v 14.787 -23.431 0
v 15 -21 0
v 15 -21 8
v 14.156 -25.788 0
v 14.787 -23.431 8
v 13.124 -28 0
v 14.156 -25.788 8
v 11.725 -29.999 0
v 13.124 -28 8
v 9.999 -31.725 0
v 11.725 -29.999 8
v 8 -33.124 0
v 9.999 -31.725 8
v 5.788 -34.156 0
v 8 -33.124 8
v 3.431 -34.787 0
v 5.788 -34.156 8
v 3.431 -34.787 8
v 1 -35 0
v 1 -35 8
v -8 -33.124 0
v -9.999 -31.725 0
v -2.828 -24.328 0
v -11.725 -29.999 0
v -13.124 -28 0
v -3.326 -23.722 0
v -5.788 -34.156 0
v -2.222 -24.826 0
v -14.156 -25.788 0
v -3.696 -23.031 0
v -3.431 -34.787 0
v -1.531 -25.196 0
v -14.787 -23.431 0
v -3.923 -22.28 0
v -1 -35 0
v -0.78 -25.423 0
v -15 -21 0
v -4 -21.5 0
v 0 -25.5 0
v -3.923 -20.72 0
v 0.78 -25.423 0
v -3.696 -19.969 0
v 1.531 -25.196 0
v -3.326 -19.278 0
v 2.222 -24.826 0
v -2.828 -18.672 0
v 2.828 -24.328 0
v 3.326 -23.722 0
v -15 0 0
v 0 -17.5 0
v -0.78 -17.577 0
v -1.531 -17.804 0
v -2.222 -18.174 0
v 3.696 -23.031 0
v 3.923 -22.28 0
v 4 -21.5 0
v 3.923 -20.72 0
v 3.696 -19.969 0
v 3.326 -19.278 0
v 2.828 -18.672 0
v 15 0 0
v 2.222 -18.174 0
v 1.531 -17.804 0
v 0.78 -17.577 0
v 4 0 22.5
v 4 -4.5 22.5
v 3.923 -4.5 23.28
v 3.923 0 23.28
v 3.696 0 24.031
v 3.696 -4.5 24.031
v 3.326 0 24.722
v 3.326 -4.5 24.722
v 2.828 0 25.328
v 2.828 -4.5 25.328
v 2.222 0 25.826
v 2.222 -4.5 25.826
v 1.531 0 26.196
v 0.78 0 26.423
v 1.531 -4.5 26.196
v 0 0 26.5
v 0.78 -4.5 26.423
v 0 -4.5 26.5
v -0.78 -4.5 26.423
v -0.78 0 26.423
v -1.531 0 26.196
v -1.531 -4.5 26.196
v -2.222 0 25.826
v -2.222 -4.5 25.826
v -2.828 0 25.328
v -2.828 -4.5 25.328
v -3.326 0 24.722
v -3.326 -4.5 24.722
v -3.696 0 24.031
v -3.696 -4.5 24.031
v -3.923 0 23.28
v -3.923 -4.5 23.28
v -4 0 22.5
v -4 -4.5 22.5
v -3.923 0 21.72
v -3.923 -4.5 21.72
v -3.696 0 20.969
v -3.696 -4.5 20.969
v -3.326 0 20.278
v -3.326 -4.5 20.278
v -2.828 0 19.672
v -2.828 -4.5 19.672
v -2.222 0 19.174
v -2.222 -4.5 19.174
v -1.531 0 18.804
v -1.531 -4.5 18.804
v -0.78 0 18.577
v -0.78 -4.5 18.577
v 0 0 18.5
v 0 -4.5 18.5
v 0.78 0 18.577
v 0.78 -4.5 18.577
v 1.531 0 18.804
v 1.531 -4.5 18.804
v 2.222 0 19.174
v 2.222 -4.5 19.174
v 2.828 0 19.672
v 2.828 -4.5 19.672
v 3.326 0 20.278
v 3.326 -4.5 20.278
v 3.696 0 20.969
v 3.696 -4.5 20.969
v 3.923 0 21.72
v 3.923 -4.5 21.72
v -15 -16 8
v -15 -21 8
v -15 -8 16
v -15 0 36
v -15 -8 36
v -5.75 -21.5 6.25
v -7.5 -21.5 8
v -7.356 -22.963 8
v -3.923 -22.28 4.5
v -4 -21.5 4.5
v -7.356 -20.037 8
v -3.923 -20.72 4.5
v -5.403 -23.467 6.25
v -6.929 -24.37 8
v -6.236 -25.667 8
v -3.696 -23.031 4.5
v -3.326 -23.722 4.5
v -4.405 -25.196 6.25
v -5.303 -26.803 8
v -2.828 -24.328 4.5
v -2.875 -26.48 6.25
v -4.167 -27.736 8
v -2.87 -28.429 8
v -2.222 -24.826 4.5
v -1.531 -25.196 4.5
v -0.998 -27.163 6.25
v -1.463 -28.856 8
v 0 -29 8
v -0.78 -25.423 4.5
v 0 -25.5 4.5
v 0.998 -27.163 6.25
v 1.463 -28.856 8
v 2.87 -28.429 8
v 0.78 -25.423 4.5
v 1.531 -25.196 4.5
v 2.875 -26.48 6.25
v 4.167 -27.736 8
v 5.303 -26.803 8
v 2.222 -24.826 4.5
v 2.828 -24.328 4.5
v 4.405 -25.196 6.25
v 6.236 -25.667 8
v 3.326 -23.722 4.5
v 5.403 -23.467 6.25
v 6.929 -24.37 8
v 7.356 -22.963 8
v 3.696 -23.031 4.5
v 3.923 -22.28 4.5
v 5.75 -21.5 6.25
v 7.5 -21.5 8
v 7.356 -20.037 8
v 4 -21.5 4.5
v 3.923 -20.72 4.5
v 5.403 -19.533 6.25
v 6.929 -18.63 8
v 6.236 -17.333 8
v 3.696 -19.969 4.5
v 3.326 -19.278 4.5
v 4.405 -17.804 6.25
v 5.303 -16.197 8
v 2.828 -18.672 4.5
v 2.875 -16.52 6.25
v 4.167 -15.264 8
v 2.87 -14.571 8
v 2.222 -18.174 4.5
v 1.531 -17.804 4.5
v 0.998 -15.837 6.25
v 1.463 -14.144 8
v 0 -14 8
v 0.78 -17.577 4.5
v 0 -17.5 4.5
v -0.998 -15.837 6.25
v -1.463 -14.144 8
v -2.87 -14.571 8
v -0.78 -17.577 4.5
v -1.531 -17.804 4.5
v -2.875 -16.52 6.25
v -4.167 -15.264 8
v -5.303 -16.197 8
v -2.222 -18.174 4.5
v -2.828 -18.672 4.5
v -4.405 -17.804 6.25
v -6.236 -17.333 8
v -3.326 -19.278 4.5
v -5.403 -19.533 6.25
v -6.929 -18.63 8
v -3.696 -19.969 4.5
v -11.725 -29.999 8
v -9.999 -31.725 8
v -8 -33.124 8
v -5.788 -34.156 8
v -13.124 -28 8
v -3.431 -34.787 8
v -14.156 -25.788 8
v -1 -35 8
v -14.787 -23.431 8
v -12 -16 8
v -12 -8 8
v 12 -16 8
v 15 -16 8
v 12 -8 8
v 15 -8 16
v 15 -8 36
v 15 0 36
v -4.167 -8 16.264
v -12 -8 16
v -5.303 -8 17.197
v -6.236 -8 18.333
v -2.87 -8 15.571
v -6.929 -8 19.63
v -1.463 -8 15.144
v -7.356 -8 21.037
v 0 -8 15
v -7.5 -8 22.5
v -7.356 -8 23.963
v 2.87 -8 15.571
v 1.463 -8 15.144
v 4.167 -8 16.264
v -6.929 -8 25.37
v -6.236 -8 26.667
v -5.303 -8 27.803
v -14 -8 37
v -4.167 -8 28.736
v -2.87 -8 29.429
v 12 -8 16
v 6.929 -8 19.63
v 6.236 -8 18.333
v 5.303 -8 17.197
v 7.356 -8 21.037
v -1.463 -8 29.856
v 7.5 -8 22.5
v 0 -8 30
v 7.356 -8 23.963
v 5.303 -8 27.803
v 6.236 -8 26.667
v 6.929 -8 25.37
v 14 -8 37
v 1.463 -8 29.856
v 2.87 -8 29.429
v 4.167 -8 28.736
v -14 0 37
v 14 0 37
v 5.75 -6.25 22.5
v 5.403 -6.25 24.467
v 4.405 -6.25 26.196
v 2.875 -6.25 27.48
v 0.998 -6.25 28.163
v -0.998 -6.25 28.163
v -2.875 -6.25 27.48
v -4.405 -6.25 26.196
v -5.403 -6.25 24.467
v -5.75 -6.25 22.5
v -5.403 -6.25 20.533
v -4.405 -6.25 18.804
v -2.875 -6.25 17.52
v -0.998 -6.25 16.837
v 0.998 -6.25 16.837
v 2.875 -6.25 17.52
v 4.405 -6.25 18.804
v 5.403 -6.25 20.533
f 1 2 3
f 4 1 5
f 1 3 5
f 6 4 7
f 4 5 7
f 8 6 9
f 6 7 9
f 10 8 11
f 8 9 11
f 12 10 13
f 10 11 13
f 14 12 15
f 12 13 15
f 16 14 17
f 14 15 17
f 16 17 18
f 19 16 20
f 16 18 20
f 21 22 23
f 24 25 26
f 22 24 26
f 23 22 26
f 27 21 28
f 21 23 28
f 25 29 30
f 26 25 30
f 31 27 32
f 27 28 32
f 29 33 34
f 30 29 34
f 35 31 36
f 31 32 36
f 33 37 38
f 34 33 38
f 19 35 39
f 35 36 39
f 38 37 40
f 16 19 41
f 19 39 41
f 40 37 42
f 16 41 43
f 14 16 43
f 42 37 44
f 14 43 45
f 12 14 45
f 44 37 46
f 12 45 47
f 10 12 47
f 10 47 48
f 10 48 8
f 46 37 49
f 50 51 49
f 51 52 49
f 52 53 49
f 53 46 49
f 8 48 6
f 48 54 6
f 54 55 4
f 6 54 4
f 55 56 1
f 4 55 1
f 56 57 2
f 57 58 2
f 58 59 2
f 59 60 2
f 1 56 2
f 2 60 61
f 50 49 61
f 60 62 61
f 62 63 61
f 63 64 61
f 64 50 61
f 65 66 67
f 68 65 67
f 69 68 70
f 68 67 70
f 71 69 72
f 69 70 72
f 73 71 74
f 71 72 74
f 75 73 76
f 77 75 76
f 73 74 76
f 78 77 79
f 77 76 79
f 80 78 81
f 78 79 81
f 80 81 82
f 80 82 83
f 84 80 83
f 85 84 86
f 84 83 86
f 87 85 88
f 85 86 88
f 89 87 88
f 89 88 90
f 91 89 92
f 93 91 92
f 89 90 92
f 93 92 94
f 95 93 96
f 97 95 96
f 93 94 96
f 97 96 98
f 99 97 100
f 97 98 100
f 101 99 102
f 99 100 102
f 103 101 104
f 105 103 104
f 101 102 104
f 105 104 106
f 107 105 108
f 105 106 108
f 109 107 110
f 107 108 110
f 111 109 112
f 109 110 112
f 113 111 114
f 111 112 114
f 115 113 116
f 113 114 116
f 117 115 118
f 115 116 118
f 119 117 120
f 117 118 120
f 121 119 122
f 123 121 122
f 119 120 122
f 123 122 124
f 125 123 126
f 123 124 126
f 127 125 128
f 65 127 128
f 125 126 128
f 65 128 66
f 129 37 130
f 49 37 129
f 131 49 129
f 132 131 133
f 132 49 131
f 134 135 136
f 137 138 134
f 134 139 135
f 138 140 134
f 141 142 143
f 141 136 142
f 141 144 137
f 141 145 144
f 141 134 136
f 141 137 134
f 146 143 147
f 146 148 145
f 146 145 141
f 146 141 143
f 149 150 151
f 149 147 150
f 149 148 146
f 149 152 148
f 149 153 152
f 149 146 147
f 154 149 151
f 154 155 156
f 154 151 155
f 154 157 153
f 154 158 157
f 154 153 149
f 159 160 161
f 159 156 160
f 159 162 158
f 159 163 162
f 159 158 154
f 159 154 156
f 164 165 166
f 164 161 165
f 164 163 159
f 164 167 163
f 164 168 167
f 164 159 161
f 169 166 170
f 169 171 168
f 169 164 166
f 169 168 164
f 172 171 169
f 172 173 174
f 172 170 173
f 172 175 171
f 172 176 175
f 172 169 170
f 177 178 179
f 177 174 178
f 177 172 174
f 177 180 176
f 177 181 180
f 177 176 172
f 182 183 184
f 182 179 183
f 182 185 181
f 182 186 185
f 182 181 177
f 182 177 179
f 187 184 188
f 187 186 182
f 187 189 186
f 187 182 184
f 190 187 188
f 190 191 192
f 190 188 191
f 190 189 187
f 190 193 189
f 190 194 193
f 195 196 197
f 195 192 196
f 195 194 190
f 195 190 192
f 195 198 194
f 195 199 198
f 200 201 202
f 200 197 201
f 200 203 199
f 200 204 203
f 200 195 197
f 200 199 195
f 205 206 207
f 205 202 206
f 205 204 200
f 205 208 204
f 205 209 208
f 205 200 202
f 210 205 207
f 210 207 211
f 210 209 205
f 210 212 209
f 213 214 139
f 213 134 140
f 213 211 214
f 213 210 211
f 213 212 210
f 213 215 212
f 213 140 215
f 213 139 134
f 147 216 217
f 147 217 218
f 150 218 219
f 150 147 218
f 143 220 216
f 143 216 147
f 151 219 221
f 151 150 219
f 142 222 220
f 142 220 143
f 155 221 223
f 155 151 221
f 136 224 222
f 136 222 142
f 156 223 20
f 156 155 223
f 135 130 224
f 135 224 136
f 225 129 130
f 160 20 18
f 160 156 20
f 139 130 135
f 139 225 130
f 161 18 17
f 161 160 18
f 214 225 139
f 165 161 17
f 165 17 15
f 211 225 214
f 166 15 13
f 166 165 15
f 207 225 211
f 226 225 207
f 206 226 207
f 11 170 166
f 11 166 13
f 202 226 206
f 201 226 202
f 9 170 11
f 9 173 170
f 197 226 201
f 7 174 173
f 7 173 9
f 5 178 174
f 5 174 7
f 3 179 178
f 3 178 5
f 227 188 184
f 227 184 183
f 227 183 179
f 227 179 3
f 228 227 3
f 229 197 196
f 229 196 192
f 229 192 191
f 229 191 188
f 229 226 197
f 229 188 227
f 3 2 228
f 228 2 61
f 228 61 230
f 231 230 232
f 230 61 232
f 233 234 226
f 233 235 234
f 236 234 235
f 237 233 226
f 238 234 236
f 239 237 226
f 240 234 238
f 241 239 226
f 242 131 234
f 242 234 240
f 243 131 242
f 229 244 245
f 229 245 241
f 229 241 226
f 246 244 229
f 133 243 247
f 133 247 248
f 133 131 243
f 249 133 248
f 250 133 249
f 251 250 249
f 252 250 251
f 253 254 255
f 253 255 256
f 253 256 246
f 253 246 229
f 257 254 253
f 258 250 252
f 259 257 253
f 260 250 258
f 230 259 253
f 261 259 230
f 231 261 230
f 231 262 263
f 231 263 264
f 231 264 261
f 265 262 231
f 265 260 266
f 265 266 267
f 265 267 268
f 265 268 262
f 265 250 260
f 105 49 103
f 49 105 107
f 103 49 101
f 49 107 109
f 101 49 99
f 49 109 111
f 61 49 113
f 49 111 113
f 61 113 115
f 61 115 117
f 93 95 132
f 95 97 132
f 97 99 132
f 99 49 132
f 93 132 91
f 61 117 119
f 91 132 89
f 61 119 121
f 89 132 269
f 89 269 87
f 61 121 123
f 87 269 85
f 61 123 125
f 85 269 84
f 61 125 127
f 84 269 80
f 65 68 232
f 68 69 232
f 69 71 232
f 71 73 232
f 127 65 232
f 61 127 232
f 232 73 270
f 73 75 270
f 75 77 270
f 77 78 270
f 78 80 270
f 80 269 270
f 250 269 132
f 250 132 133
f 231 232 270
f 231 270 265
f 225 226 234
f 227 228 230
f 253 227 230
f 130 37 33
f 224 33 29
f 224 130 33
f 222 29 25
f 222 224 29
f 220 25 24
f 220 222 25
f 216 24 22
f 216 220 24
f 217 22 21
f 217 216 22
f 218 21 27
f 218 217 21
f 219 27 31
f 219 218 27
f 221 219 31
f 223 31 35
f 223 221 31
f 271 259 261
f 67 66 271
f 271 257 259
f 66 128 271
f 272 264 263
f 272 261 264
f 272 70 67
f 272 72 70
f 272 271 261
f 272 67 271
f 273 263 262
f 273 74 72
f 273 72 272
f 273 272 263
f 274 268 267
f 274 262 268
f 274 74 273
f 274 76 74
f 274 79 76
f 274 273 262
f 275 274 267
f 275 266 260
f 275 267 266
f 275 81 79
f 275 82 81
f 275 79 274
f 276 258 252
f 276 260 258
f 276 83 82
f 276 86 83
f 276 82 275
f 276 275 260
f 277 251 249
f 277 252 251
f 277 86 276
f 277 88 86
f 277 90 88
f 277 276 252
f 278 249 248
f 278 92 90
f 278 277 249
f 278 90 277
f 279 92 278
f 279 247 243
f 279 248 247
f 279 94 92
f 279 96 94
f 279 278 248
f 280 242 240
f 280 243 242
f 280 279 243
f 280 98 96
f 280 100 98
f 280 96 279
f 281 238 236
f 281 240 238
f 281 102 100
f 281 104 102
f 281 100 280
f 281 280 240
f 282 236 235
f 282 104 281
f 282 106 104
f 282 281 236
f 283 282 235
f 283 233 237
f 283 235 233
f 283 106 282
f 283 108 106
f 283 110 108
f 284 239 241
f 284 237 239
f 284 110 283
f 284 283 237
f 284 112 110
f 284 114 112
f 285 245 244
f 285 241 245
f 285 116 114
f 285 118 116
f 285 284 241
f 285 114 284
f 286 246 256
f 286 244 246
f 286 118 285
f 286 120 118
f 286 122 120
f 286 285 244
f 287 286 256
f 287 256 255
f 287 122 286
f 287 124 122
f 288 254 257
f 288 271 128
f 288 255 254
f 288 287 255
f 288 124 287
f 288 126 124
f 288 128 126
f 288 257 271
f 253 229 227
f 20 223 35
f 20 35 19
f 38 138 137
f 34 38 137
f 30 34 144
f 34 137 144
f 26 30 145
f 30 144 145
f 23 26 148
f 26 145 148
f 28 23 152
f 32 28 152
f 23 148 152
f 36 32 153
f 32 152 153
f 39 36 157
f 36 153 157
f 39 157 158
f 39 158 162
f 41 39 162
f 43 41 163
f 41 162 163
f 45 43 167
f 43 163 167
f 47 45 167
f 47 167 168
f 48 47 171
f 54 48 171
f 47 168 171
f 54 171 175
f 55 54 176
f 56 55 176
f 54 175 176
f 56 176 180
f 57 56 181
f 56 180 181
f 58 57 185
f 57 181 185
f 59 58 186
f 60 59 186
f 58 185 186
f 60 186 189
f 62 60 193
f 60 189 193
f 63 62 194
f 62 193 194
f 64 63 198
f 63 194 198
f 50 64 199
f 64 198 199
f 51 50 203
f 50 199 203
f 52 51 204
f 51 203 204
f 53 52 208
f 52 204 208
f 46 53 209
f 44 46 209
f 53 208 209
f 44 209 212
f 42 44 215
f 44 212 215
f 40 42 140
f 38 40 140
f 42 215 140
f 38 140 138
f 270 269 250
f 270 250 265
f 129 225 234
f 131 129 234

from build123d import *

# Parameters (mm, degrees)
SKETCH_W        = 30
SKETCH_H        = 37
PAD_DEPTH       = 35
FILLET_R        = 14
BOX_W           = 32
BOX_H           = 32
BOX_DEPTH       = 32
SKETCH001_R     = 4
POCKET_DEPTH    = 8
SKETCH002_R     = 4
POCKET001_DEPTH = 8
CHAMFER_SIZE    = 3.5
CHAMFER001_SIZE = 1
SKETCH003_W     = 3
SKETCH003_H     = 8
PAD001_DEPTH    = 8
POCKET002_DEPTH = 30.001


with BuildPart() as part:
    # Sketch → Pad (new body)
    with BuildSketch(Plane.XZ):
        with Locations((0, 18.5)):
            Rectangle(SKETCH_W, SKETCH_H)
    extrude(amount=PAD_DEPTH)

    # Fillet
    fillet_edges = [part.edges().sort_by_distance(p)[0] for p in [
        (15, -35, 18.5),
        (-15, -35, 18.5),
    ]]
    fillet(fillet_edges, radius=FILLET_R)

    # Box → Box (cut)
    with BuildSketch(Plane(origin=(-16, -8, 8), x_dir=(1, 0, 0), z_dir=(0, -1, 0))):
        with Locations((16, 16)):
            Rectangle(BOX_W, BOX_H)
    extrude(amount=BOX_DEPTH, mode=Mode.SUBTRACT)

    # Sketch001 (on Face6 of Box) → Pocket (cut)
    with BuildSketch(Plane(origin=(0, -8, 22.5), x_dir=(1, 0, 0), z_dir=(0, -1, 0))):
        Circle(SKETCH001_R)
    extrude(amount=-POCKET_DEPTH, mode=Mode.SUBTRACT)

    # Sketch002 (on Face5 of Pocket) → Pocket001 (cut)
    with BuildSketch(Plane(origin=(0, -21.5, 8), x_dir=(-1, 0, 0), z_dir=(0, 0, 1))):
        Circle(SKETCH002_R)
    extrude(amount=-POCKET001_DEPTH, mode=Mode.SUBTRACT)

    # Chamfer
    chamfer_edges = [part.edges().sort_by_distance(p)[0] for p in [
        (-4, -8, 22.5),
        (4, -21.5, 8),
    ]]
    chamfer(chamfer_edges, length=CHAMFER_SIZE)

    # Chamfer001
    chamfer001_edges = [part.edges().sort_by_distance(p)[0] for p in [
        (15, -4, 37),
        (-15, -4, 37),
    ]]
    chamfer(chamfer001_edges, length=CHAMFER001_SIZE)

    # Sketch003 (on Face1 of Chamfer001) → Pad001 (join)
    with BuildSketch(Plane(origin=(0, -8, 8), x_dir=(1, 0, 0), z_dir=(0, -1, 0))):
        with Locations((13.5, 4)):
            Rectangle(SKETCH003_W, SKETCH003_H)
        with Locations((-13.5, 4)):
            Rectangle(SKETCH003_W, SKETCH003_H)
    extrude(amount=PAD001_DEPTH)

    # Sketch004 (on Face21 of Pad001) → Pocket002 (cut, through all)
    with BuildSketch(Plane(origin=(15, -8, 8), x_dir=(0, 0, 1), z_dir=(1, 0, 0))):
        Polygon((0, 8), (8, 0), (8, 8), align=None)
    extrude(amount=-POCKET002_DEPTH, mode=Mode.SUBTRACT)


solid = part.part
